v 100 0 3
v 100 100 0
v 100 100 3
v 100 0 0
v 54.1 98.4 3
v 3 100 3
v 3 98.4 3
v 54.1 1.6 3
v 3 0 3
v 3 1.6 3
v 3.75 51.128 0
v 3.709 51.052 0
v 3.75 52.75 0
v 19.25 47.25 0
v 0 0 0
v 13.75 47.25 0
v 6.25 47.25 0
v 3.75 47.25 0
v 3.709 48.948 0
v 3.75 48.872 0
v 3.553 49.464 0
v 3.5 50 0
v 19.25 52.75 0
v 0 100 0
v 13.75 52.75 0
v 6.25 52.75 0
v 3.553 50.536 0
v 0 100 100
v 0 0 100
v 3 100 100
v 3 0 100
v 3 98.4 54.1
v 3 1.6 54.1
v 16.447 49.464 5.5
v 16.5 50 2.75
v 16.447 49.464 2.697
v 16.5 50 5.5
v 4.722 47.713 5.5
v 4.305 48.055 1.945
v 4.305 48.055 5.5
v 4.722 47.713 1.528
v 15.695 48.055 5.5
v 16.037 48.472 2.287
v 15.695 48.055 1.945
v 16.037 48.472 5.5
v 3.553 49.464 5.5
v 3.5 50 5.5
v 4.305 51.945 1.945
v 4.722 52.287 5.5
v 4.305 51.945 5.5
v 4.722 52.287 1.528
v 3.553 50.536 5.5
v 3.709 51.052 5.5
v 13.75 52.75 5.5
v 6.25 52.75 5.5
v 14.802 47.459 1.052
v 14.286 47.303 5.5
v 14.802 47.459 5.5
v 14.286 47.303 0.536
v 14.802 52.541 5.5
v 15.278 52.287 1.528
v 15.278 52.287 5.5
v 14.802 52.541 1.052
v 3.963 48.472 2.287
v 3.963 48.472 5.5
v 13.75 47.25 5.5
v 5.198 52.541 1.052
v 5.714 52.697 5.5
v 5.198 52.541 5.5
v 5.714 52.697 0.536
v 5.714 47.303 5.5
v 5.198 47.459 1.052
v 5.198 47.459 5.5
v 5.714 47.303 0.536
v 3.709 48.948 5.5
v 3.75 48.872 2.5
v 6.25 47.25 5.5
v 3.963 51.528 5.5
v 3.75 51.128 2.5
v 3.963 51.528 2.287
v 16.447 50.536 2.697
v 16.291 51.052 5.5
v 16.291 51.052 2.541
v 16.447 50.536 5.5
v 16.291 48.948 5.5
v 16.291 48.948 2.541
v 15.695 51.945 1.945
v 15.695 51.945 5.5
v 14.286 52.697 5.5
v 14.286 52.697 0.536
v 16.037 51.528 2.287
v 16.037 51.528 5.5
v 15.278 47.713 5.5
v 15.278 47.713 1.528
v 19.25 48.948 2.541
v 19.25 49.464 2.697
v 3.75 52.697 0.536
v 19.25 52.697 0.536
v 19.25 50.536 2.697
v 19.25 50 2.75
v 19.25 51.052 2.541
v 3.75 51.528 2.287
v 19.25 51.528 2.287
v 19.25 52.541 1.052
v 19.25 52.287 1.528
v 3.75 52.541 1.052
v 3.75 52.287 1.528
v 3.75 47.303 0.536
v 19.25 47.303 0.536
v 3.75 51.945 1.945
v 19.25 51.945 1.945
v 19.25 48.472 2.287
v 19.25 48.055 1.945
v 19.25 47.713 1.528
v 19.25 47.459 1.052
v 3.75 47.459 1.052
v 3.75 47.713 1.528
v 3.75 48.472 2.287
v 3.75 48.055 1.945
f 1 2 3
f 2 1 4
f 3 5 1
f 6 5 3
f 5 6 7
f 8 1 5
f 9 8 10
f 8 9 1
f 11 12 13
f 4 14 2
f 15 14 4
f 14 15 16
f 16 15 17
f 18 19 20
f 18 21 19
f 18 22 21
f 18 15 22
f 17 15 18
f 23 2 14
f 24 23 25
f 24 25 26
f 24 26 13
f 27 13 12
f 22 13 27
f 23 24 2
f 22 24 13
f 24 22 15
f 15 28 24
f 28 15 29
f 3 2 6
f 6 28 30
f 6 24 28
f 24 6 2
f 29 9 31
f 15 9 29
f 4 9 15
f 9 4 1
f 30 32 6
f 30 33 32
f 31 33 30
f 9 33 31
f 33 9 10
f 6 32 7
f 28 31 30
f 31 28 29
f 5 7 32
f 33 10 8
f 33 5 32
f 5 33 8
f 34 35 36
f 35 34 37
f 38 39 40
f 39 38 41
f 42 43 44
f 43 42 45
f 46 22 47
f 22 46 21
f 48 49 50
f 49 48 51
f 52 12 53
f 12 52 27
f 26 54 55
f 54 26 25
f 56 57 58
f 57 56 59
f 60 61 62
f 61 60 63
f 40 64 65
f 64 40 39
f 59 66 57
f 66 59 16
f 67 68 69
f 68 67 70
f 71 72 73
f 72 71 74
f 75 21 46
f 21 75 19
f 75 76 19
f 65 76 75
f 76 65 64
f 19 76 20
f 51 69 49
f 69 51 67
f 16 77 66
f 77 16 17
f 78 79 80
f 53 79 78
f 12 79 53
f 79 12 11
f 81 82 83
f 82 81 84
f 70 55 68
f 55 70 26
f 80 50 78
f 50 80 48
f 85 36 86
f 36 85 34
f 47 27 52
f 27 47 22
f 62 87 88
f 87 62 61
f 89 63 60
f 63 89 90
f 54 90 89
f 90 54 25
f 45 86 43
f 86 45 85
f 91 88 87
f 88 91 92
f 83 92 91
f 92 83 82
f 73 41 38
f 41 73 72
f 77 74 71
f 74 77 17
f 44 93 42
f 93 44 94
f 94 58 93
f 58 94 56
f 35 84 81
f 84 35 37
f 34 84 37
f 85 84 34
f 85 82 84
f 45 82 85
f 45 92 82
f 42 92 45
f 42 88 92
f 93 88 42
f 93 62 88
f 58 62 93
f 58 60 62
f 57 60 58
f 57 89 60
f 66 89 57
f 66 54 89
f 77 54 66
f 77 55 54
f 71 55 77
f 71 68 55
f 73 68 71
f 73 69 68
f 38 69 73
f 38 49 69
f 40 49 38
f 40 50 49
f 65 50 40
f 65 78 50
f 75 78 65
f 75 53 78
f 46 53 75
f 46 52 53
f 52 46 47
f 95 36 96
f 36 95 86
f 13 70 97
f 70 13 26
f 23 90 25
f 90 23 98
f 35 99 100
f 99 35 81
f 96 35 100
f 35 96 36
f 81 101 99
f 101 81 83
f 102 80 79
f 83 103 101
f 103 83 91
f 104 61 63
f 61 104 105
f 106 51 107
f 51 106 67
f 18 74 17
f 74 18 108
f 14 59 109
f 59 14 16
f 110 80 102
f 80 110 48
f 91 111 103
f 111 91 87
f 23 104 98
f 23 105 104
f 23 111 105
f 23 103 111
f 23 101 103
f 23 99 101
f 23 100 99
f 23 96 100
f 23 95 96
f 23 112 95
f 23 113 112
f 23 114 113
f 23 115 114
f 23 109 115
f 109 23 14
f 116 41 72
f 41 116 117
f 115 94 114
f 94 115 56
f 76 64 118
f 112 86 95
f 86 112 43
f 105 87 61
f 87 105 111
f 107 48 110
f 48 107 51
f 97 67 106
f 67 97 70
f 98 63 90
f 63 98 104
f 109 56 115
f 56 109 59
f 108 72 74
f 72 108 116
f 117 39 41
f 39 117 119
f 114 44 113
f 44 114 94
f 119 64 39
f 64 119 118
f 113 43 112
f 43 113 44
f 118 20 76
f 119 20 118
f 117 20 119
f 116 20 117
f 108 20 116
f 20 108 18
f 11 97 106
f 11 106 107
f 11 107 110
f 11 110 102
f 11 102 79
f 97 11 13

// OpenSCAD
$fn = 32;
// ----------------------------------------------------------------------
// L-bracket: 100 x 100 x 100 mm
// ----------------------------------------------------------------------
// --- parameters (mm) ---
base_len = 100;            // horizontal leg, X
upright_h = 100;            // vertical leg, Z
flange_w = 100;             // bracket depth, Y
mat_t = 3;                  // plate thickness
hole_d = 4.5;               // clearance for M4
slot_w = 5.5;               // euro screw slot width
slot_l = 13;                // euro screw slot length
rib_leg = 55.5;             // gusset leg
rib_sink = 1.6;             // gusset overlap into the plates
module hole_z(px, py) {
  translate([px, py, -2.5]) cylinder(h = mat_t + 5, d = hole_d);
}
module hole_x(pz, py) {
  translate([-2.5, py, pz]) rotate([0, 90, 0]) cylinder(h = mat_t + 5, d = hole_d);
}
module euro_slot_z(px, py) {
  hull() {
    translate([px - (slot_l - slot_w) / 2, py, -2.5]) cylinder(h = mat_t + 5, d = slot_w);
    translate([px + (slot_l - slot_w) / 2, py, -2.5]) cylinder(h = mat_t + 5, d = slot_w);
  }
}
module euro_slot_x(pz, py) {
  translate([-2.5, 0, 0]) rotate([0, 90, 0]) hull() {
    translate([0, py, pz - (slot_l - slot_w) / 2]) cylinder(h = mat_t + 5, d = slot_w);
    translate([0, py, pz + (slot_l - slot_w) / 2]) cylinder(h = mat_t + 5, d = slot_w);
  }
}
module gusset() {
  translate([0, flange_w - rib_sink, 0])
    rotate([90, 0, 0])
      linear_extrude(height = flange_w - 2 * rib_sink)
        polygon(points = [[rib_sink, rib_sink], [rib_leg, rib_sink], [rib_sink, rib_leg]]);
}
difference() {
  union() {
    /* horizontal leg */
    cube([base_len, flange_w, mat_t]);
    /* vertical leg, overlapping the corner block */
    cube([mat_t, flange_w, upright_h]);
    gusset();
  }
  euro_slot_z(10, 50);
  euro_slot_x(10, 50);
}
